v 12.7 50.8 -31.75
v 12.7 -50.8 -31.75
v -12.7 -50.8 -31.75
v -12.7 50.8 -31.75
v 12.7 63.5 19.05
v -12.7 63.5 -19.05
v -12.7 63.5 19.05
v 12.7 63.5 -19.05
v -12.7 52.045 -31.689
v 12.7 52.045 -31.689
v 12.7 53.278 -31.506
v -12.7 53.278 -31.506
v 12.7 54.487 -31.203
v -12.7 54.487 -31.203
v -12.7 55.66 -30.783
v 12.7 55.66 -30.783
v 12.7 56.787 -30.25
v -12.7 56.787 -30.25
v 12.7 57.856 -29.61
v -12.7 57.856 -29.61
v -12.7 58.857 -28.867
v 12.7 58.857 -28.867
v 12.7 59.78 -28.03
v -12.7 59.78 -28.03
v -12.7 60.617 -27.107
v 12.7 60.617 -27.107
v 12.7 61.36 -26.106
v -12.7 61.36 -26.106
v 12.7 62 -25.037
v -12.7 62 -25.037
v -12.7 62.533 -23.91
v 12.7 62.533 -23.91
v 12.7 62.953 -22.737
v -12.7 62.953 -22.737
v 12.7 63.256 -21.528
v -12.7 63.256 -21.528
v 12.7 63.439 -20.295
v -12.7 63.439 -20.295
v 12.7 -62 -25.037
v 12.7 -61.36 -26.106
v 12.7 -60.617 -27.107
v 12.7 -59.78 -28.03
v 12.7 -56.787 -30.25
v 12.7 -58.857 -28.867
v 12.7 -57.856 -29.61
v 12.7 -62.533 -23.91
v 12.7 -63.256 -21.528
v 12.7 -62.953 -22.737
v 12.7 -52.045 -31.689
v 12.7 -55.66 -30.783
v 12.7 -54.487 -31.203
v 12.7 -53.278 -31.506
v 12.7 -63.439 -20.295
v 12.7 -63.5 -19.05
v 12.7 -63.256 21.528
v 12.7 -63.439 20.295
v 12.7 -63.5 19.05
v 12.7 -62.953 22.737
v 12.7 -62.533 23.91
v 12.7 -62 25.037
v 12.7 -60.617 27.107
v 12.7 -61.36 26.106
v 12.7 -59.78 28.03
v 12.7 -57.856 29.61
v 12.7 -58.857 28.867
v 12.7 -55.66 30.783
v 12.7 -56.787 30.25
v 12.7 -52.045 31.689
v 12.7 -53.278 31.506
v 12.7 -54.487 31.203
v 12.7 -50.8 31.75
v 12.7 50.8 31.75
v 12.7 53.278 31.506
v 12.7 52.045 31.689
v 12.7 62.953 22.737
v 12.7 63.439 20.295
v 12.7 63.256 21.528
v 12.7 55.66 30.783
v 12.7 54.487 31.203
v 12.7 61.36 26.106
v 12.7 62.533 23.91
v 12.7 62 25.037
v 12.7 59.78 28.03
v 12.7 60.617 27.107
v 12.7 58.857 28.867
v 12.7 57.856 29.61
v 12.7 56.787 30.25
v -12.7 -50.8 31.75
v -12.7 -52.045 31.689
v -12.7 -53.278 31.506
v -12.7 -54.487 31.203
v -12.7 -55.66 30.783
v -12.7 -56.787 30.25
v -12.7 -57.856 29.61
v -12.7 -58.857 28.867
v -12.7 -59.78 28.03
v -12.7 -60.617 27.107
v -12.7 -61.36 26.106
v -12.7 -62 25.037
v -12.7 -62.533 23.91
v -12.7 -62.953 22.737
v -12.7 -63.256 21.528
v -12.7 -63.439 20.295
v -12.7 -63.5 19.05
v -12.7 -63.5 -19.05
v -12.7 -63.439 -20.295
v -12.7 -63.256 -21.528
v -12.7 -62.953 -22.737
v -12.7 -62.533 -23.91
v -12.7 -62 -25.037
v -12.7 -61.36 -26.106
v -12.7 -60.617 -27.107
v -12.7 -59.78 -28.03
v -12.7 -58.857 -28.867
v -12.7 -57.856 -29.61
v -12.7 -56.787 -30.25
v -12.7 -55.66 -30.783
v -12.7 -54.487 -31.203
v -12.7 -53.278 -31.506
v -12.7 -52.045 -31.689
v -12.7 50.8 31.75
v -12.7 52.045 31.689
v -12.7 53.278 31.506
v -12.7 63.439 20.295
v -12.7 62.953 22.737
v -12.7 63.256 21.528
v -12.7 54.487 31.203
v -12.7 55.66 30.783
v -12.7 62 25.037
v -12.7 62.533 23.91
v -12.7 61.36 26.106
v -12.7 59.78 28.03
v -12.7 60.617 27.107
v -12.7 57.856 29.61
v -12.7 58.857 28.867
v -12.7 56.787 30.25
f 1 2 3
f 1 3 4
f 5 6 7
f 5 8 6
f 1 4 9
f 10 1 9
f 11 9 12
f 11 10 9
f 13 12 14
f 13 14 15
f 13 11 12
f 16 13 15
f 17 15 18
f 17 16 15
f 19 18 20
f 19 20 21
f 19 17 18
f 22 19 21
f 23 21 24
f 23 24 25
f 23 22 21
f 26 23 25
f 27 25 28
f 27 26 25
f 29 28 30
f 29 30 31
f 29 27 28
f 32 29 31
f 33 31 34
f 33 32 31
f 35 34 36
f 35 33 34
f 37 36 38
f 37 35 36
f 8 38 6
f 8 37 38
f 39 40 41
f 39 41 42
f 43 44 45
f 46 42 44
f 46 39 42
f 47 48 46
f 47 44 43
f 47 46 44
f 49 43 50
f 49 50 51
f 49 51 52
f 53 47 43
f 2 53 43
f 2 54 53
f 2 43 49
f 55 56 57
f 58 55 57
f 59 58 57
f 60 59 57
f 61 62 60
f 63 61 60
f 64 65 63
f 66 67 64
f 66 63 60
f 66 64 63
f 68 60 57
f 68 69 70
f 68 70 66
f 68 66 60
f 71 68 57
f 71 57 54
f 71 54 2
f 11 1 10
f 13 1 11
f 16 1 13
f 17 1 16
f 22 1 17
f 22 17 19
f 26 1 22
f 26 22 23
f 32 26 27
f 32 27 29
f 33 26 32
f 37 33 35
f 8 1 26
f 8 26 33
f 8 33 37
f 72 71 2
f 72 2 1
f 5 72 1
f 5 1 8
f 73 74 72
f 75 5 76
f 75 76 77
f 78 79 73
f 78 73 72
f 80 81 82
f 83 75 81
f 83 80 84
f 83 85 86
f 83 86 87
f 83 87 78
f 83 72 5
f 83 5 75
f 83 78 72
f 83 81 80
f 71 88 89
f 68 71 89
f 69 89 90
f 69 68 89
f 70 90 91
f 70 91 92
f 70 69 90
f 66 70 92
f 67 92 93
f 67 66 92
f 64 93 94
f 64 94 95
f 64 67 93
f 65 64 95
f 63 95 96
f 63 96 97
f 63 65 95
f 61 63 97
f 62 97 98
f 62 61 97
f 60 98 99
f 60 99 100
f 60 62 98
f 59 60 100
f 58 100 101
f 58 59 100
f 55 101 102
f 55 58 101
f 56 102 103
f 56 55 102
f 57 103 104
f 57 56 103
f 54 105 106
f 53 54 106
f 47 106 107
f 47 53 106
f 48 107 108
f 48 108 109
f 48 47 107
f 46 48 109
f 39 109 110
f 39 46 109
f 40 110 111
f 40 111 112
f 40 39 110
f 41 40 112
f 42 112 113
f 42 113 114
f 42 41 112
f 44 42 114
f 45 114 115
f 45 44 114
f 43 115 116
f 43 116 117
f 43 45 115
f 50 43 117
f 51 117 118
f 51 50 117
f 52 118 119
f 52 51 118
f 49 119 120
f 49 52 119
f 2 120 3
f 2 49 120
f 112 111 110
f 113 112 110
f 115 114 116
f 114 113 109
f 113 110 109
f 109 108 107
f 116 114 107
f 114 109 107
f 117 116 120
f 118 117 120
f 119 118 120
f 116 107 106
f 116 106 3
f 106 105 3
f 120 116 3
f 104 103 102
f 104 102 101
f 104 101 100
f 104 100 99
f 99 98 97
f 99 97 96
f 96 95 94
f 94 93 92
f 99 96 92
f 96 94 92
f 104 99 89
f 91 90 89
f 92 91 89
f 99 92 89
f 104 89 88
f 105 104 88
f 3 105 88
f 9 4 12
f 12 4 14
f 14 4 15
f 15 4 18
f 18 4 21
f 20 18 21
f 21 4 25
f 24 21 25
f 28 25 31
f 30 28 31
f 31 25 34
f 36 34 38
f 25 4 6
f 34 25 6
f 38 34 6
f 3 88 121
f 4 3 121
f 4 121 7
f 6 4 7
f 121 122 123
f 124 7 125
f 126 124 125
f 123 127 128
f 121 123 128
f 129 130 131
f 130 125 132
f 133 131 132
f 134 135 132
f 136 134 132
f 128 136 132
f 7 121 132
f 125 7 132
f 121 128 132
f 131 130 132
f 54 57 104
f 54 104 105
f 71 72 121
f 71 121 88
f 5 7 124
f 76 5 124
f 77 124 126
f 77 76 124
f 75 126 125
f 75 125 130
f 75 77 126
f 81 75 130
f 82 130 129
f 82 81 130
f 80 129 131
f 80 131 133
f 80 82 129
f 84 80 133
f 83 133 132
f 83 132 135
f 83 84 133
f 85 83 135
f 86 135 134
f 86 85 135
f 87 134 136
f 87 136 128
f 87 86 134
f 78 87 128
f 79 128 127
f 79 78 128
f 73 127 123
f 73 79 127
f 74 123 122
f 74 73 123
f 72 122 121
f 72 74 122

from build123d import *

# Parameters (mm, degrees)
F1_DEPTH = 12.7


with BuildPart() as f1:
    # F0 (on Right) → F1 (new body, symmetric)
    with BuildSketch(Plane.YZ):
        with BuildLine():
            ThreePointArc((63.5, 19.05), (59.780256, 28.030256), (50.8, 31.75))
            Line((50.8, 31.75), (-50.8, 31.75))
            ThreePointArc((-50.8, 31.75), (-59.780256, 28.030256), (-63.5, 19.05))
            Line((-63.5, 19.05), (-63.5, -19.05))
            ThreePointArc((-63.5, -19.05), (-59.780256, -28.030256), (-50.8, -31.75))
            Line((-50.8, -31.75), (50.8, -31.75))
            ThreePointArc((50.8, -31.75), (59.780256, -28.030256), (63.5, -19.05))
            Line((63.5, -19.05), (63.5, 19.05))
        make_face()
    extrude(amount=F1_DEPTH, both=True)


solid = f1.part
